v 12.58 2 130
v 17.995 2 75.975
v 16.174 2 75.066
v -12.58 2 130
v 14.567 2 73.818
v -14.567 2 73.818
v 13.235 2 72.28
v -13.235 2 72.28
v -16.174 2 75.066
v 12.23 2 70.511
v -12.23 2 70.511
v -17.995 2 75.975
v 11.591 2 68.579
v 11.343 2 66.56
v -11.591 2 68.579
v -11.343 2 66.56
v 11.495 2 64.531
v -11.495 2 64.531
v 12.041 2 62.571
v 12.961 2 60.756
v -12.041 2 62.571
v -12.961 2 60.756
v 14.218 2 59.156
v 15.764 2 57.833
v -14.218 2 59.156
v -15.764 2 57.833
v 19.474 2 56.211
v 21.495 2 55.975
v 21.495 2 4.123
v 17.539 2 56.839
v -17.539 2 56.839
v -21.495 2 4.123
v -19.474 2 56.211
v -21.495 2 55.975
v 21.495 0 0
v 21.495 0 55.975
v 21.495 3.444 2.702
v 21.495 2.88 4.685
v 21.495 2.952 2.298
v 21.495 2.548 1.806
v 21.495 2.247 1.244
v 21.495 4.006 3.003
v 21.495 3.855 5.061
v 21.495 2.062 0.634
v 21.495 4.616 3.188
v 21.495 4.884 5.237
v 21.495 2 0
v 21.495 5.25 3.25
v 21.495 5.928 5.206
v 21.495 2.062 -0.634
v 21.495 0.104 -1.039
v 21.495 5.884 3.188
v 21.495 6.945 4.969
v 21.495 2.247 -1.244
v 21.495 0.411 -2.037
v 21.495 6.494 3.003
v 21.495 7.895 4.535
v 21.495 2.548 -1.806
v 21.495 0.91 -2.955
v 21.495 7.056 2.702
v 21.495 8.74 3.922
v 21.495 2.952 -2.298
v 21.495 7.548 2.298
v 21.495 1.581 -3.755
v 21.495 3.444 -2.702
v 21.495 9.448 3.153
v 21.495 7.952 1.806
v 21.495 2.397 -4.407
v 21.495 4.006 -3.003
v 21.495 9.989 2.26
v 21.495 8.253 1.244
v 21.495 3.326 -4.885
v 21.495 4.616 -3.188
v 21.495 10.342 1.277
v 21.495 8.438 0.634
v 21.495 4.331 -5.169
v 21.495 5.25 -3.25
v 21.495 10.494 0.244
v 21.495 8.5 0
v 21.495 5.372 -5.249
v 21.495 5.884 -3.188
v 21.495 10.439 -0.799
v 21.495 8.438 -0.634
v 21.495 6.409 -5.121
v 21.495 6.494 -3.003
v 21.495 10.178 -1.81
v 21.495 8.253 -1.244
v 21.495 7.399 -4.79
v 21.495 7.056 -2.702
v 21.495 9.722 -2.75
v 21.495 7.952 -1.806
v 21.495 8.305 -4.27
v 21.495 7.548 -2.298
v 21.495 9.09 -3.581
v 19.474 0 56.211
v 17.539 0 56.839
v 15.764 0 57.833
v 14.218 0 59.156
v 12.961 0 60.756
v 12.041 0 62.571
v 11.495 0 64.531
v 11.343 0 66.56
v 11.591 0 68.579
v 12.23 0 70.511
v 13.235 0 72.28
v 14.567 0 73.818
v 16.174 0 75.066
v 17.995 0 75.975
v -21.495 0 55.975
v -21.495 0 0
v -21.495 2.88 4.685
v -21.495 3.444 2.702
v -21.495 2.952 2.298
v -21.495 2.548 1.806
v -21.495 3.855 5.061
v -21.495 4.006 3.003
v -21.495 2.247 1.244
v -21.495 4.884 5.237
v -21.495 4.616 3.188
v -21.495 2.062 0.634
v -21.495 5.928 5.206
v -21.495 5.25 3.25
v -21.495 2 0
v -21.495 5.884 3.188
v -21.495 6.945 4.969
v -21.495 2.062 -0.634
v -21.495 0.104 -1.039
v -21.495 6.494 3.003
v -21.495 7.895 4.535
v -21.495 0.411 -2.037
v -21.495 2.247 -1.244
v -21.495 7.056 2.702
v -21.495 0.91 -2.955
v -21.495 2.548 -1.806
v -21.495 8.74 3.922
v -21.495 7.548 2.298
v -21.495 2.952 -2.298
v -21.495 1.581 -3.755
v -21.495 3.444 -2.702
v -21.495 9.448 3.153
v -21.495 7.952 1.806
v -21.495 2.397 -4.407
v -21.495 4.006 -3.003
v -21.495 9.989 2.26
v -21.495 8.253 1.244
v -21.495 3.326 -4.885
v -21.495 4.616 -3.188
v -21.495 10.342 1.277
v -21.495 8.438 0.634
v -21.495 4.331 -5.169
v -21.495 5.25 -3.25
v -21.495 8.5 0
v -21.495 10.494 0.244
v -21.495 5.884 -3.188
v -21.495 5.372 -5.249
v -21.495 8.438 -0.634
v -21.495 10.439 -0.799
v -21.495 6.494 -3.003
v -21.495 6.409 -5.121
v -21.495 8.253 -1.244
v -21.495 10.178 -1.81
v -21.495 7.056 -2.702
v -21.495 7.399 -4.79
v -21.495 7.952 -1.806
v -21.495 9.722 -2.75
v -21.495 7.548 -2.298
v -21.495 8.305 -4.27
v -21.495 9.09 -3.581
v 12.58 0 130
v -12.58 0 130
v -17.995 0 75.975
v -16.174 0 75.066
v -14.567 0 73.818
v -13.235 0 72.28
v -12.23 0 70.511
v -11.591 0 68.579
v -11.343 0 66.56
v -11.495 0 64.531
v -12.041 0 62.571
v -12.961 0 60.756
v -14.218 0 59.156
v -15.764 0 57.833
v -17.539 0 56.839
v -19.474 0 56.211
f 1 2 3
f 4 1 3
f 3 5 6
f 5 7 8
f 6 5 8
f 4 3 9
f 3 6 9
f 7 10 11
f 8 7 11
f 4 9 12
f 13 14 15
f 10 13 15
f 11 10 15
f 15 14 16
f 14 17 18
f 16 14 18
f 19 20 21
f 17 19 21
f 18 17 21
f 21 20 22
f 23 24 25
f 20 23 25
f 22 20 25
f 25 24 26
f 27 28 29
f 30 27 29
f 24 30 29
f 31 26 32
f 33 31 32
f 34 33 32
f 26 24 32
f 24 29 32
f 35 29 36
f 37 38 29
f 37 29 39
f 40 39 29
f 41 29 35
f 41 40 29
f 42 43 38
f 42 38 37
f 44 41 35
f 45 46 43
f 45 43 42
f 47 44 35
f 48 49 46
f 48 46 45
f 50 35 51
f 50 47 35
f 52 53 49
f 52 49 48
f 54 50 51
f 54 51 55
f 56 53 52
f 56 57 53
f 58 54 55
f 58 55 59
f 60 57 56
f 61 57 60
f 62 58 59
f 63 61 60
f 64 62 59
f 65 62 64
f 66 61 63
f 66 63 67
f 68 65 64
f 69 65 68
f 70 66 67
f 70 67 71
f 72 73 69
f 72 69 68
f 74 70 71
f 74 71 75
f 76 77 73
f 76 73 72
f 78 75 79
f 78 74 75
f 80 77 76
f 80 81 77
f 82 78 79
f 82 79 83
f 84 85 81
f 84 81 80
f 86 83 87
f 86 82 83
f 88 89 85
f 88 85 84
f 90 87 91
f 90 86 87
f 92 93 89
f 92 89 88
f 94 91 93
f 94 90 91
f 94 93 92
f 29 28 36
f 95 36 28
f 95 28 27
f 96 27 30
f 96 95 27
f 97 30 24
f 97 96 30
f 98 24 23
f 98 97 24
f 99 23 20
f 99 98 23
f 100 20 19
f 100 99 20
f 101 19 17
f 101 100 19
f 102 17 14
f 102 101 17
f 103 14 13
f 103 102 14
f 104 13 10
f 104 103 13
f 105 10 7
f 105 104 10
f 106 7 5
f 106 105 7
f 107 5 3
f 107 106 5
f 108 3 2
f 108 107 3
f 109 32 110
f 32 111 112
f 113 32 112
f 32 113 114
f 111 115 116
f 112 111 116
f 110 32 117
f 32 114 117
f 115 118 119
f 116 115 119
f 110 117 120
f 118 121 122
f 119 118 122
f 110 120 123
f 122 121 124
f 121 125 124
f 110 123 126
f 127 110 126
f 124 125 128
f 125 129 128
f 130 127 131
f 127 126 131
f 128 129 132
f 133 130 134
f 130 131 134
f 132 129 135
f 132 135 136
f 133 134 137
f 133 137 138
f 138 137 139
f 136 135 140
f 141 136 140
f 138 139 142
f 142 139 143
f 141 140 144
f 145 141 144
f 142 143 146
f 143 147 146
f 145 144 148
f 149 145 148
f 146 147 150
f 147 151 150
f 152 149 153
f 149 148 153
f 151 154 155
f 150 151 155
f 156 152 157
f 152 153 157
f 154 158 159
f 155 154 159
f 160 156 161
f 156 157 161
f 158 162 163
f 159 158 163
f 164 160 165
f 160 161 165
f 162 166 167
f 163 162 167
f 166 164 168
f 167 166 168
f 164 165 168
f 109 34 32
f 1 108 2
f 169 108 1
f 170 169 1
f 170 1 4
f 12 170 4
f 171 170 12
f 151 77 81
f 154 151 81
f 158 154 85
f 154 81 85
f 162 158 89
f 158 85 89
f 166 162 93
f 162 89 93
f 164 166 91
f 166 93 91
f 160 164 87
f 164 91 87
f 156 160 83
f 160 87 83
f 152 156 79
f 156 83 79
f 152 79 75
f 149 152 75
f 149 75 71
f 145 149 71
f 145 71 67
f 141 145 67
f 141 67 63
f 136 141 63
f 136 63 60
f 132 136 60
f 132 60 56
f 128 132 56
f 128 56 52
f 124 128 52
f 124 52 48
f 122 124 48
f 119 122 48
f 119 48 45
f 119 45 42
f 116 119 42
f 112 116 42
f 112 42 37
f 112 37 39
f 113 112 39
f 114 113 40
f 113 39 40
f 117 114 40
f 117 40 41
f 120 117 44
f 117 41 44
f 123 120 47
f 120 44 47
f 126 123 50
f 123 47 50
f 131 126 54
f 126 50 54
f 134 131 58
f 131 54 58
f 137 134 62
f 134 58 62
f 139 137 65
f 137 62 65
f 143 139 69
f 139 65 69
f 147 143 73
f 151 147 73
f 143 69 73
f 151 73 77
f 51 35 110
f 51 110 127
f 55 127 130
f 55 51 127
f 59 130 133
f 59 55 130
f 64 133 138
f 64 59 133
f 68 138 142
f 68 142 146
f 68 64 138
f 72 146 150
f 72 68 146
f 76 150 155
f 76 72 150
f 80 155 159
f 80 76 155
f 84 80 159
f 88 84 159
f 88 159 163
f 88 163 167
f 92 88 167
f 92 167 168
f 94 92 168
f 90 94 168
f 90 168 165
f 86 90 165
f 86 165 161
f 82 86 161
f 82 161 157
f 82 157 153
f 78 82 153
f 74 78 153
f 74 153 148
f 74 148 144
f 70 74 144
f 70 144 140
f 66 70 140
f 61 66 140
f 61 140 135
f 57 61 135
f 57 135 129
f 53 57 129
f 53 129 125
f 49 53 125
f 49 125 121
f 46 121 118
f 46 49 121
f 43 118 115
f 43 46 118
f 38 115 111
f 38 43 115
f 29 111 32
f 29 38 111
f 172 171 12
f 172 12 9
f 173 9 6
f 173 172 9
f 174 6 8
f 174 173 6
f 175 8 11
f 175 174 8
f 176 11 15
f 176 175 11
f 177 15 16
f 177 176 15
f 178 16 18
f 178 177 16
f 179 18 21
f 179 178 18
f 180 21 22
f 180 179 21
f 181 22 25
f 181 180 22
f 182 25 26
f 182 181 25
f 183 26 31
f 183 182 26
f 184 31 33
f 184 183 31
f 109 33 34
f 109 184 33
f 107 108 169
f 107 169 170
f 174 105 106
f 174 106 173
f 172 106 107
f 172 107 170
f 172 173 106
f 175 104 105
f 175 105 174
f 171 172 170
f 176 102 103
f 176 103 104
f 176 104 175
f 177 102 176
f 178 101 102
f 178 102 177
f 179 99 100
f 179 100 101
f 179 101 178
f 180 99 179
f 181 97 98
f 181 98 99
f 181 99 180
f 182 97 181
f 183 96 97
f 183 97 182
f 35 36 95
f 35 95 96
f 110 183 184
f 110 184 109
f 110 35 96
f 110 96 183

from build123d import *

# Parameters (mm, degrees)
EXTRUDE_1_DEPTH = 2
SKETCH_4_R      = 5.25
SKETCH_4_R_2    = 3.25
EXTRUDE_4_DEPTH = 42.99


with BuildPart() as part:
    # Эскиз1 → Бобышка-Вытянуть1 (new body)
    with BuildSketch(Plane(origin=(0, 0, 0), x_dir=(1, 0, 0), z_dir=(0, 1, 0))):
        with BuildLine():
            Line((-21.495, 0), (21.495, 0))
            Line((21.495, 0), (21.495, -55.974685573))
            ThreePointArc((21.495, -55.974685573), (11.495, -64.530824352), (17.994657773, -75.974685573))
            Line((17.994657773, -75.974685573), (12.58, -130))
            Line((12.58, -130), (-12.58, -130))
            Line((-12.58, -130), (-17.994657773, -75.974685573))
            ThreePointArc((-17.994657773, -75.974685573), (-11.495, -64.530824352), (-21.495, -55.974685573))
            Line((-21.495, -55.974685573), (-21.495, 0))
        make_face()
    extrude(amount=EXTRUDE_1_DEPTH)

    # Эскиз4 → Бобышка-Вытянуть4 (add)
    with BuildSketch(Plane(origin=(21.495, 0, 0.569378428), x_dir=(0, 0, -1), z_dir=(1, 0, 0))):
        with Locations((0.569378428, 5.25)):
            Circle(SKETCH_4_R)
        with Locations((0.569378428, 5.25)):
            Circle(SKETCH_4_R_2, mode=Mode.SUBTRACT)
    extrude(amount=-EXTRUDE_4_DEPTH)


solid = part.part
